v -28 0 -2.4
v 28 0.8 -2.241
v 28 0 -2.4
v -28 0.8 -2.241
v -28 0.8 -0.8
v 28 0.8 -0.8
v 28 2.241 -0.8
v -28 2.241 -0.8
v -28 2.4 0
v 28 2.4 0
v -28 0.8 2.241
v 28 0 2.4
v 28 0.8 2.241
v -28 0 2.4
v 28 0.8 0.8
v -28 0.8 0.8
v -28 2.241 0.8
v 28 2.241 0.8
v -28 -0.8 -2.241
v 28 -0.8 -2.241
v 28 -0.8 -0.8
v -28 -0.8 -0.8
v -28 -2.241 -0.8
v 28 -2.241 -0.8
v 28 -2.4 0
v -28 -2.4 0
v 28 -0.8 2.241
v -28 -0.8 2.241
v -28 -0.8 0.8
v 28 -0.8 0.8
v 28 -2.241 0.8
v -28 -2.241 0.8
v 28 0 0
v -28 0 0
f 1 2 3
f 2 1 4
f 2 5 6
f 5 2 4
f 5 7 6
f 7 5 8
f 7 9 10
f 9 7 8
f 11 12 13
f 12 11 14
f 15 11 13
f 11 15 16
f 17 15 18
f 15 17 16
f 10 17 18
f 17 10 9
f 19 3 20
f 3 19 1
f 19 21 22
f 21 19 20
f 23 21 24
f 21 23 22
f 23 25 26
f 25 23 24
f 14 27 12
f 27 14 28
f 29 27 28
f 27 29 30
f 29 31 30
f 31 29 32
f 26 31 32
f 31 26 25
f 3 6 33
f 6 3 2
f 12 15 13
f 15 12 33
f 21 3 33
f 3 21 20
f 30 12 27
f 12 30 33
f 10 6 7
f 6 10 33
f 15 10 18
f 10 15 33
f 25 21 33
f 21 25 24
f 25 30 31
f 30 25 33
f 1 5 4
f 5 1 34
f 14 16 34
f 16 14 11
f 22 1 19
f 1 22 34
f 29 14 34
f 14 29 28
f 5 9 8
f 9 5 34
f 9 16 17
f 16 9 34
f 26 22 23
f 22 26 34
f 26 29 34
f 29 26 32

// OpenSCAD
// file: ../p/axle.scad
use <../lib.scad>
function ldraw_lib__axle() = [
// 0 Axle
// 0 Name: axle.dat
// 0 Author: James Jessiman
// 0 !LDRAW_ORG Primitive UPDATE 2003-01
// 0 !LICENSE Licensed under CC BY 2.0 and CC BY 4.0 : see CAreadme.txt
// 
// 0 BFC CERTIFY CCW
  [0,"BFC","CERTIFY"],
  [0,"BFC","CCW"],
// 
// 0 !HISTORY 2000-04-23 [sbliss] Added conditional edges along outermost diameters
// 0 !HISTORY 2000-05-07 [PTadmin] Official Update 2000-01
// 0 !HISTORY 2002-11-08 [OrionP] Adjusted fit and precision
// 0 !HISTORY 2003-03-12 [PTadmin] Official Update 2003-01
// 0 !HISTORY 2007-06-24 [PTadmin] Header formatted for Contributor Agreement
// 0 !HISTORY 2008-07-01 [PTadmin] Official Update 2008-01
// 
// 
// 5 24 6 0 0 6 1 0 5.602 0 2 5.602 0 -2
  [5,24,6,0,0,6,1,0,5.602,0,2,5.602,0,-2],
// 5 24 0 0 6 0 1 6 2 0 5.602 -2 0 5.602
  [5,24,0,0,6,0,1,6,2,0,5.602,-2,0,5.602],
// 5 24 -6 0 0 -6 1 0 -5.602 0 -2 -5.602 0 2
  [5,24,-6,0,0,-6,1,0,-5.602,0,-2,-5.602,0,2],
// 5 24 0 0 -6 0 1 -6 -2 0 -5.602 2 0 -5.602
  [5,24,0,0,-6,0,1,-6,-2,0,-5.602,2,0,-5.602],
// 
// 2 24 6 0 0 5.602 0 2
  [2,24,6,0,0,5.602,0,2],
// 2 24 5.602 0 2 2 0 2
  [2,24,5.602,0,2,2,0,2],
// 2 24 2 0 2 2 0 5.602
  [2,24,2,0,2,2,0,5.602],
// 2 24 2 0 5.602 0 0 6
  [2,24,2,0,5.602,0,0,6],
// 2 24 -6 0 0 -5.602 0 2
  [2,24,-6,0,0,-5.602,0,2],
// 2 24 -5.602 0 2 -2 0 2
  [2,24,-5.602,0,2,-2,0,2],
// 2 24 -2 0 2 -2 0 5.602
  [2,24,-2,0,2,-2,0,5.602],
// 2 24 -2 0 5.602 -0 0 6
  [2,24,-2,0,5.602,-0,0,6],
// 2 24 6 0 -0 5.602 0 -2
  [2,24,6,0,-0,5.602,0,-2],
// 2 24 5.602 0 -2 2 0 -2
  [2,24,5.602,0,-2,2,0,-2],
// 2 24 2 0 -2 2 0 -5.602
  [2,24,2,0,-2,2,0,-5.602],
// 2 24 2 0 -5.602 0 0 -6
  [2,24,2,0,-5.602,0,0,-6],
// 2 24 -6 0 -0 -5.602 0 -2
  [2,24,-6,0,-0,-5.602,0,-2],
// 2 24 -5.602 0 -2 -2 0 -2
  [2,24,-5.602,0,-2,-2,0,-2],
// 2 24 -2 0 -2 -2 0 -5.602
  [2,24,-2,0,-2,-2,0,-5.602],
// 2 24 -2 0 -5.602 -0 0 -6
  [2,24,-2,0,-5.602,-0,0,-6],
// 2 24 6 1 0 5.602 1 2
  [2,24,6,1,0,5.602,1,2],
// 2 24 5.602 1 2 2 1 2
  [2,24,5.602,1,2,2,1,2],
// 2 24 2 1 2 2 1 5.602
  [2,24,2,1,2,2,1,5.602],
// 2 24 2 1 5.602 0 1 6
  [2,24,2,1,5.602,0,1,6],
// 2 24 -6 1 0 -5.602 1 2
  [2,24,-6,1,0,-5.602,1,2],
// 2 24 -5.602 1 2 -2 1 2
  [2,24,-5.602,1,2,-2,1,2],
// 2 24 -2 1 2 -2 1 5.602
  [2,24,-2,1,2,-2,1,5.602],
// 2 24 -2 1 5.602 -0 1 6
  [2,24,-2,1,5.602,-0,1,6],
// 2 24 6 1 -0 5.602 1 -2
  [2,24,6,1,-0,5.602,1,-2],
// 2 24 5.602 1 -2 2 1 -2
  [2,24,5.602,1,-2,2,1,-2],
// 2 24 2 1 -2 2 1 -5.602
  [2,24,2,1,-2,2,1,-5.602],
// 2 24 2 1 -5.602 0 1 -6
  [2,24,2,1,-5.602,0,1,-6],
// 2 24 -6 1 -0 -5.602 1 -2
  [2,24,-6,1,-0,-5.602,1,-2],
// 2 24 -5.602 1 -2 -2 1 -2
  [2,24,-5.602,1,-2,-2,1,-2],
// 2 24 -2 1 -2 -2 1 -5.602
  [2,24,-2,1,-2,-2,1,-5.602],
// 2 24 -2 1 -5.602 -0 1 -6
  [2,24,-2,1,-5.602,-0,1,-6],
// 
// 2 24 5.602 0 2 5.602 1 2
  [2,24,5.602,0,2,5.602,1,2],
// 2 24 2 0 2 2 1 2
  [2,24,2,0,2,2,1,2],
// 2 24 2 0 5.602 2 1 5.602
  [2,24,2,0,5.602,2,1,5.602],
// 2 24 -5.602 0 2 -5.602 1 2
  [2,24,-5.602,0,2,-5.602,1,2],
// 2 24 -2 0 2 -2 1 2
  [2,24,-2,0,2,-2,1,2],
// 2 24 -2 0 5.602 -2 1 5.602
  [2,24,-2,0,5.602,-2,1,5.602],
// 2 24 5.602 0 -2 5.602 1 -2
  [2,24,5.602,0,-2,5.602,1,-2],
// 2 24 2 0 -2 2 1 -2
  [2,24,2,0,-2,2,1,-2],
// 2 24 2 0 -5.602 2 1 -5.602
  [2,24,2,0,-5.602,2,1,-5.602],
// 2 24 -5.602 0 -2 -5.602 1 -2
  [2,24,-5.602,0,-2,-5.602,1,-2],
// 2 24 -2 0 -2 -2 1 -2
  [2,24,-2,0,-2,-2,1,-2],
// 2 24 -2 0 -5.602 -2 1 -5.602
  [2,24,-2,0,-5.602,-2,1,-5.602],
// 
// 4 16 6 0 0 6 1 0 5.602 1 2 5.602 0 2
  [4,16,6,0,0,6,1,0,5.602,1,2,5.602,0,2],
// 4 16 5.602 0 2 5.602 1 2 2 1 2 2 0 2
  [4,16,5.602,0,2,5.602,1,2,2,1,2,2,0,2],
// 4 16 2 0 2 2 1 2 2 1 5.602 2 0 5.602
  [4,16,2,0,2,2,1,2,2,1,5.602,2,0,5.602],
// 4 16 2 0 5.602 2 1 5.602 0 1 6 0 0 6
  [4,16,2,0,5.602,2,1,5.602,0,1,6,0,0,6],
// 4 16 -6 0 0 -5.602 0 2 -5.602 1 2 -6 1 0
  [4,16,-6,0,0,-5.602,0,2,-5.602,1,2,-6,1,0],
// 4 16 -5.602 0 2 -2 0 2 -2 1 2 -5.602 1 2
  [4,16,-5.602,0,2,-2,0,2,-2,1,2,-5.602,1,2],
// 4 16 -2 0 2 -2 0 5.602 -2 1 5.602 -2 1 2
  [4,16,-2,0,2,-2,0,5.602,-2,1,5.602,-2,1,2],
// 4 16 -2 0 5.602 -0 0 6 -0 1 6 -2 1 5.602
  [4,16,-2,0,5.602,-0,0,6,-0,1,6,-2,1,5.602],
// 4 16 6 0 -0 5.602 0 -2 5.602 1 -2 6 1 -0
  [4,16,6,0,-0,5.602,0,-2,5.602,1,-2,6,1,-0],
// 4 16 5.602 0 -2 2 0 -2 2 1 -2 5.602 1 -2
  [4,16,5.602,0,-2,2,0,-2,2,1,-2,5.602,1,-2],
// 4 16 2 0 -2 2 0 -5.602 2 1 -5.602 2 1 -2
  [4,16,2,0,-2,2,0,-5.602,2,1,-5.602,2,1,-2],
// 4 16 2 0 -5.602 0 0 -6 0 1 -6 2 1 -5.602
  [4,16,2,0,-5.602,0,0,-6,0,1,-6,2,1,-5.602],
// 4 16 -6 0 -0 -6 1 -0 -5.602 1 -2 -5.602 0 -2
  [4,16,-6,0,-0,-6,1,-0,-5.602,1,-2,-5.602,0,-2],
// 4 16 -5.602 0 -2 -5.602 1 -2 -2 1 -2 -2 0 -2
  [4,16,-5.602,0,-2,-5.602,1,-2,-2,1,-2,-2,0,-2],
// 4 16 -2 0 -2 -2 1 -2 -2 1 -5.602 -2 0 -5.602
  [4,16,-2,0,-2,-2,1,-2,-2,1,-5.602,-2,0,-5.602],
// 4 16 -2 0 -5.602 -2 1 -5.602 -0 1 -6 -0 0 -6
  [4,16,-2,0,-5.602,-2,1,-5.602,-0,1,-6,-0,0,-6],
// 
// 4 16 6 0 0 5.602 0 2 2 0 2 0 0 0
  [4,16,6,0,0,5.602,0,2,2,0,2,0,0,0],
// 4 16 -6 0 0 0 0 0 -2 0 2 -5.602 0 2
  [4,16,-6,0,0,0,0,0,-2,0,2,-5.602,0,2],
// 4 16 6 0 0 0 0 0 2 0 -2 5.602 0 -2
  [4,16,6,0,0,0,0,0,2,0,-2,5.602,0,-2],
// 4 16 -6 0 0 -5.602 0 -2 -2 0 -2 0 0 0
  [4,16,-6,0,0,-5.602,0,-2,-2,0,-2,0,0,0],
// 4 16 0 0 6 0 0 0 2 0 2 2 0 5.602
  [4,16,0,0,6,0,0,0,2,0,2,2,0,5.602],
// 4 16 0 0 6 -2 0 5.602 -2 0 2 0 0 0
  [4,16,0,0,6,-2,0,5.602,-2,0,2,0,0,0],
// 4 16 0 0 -6 2 0 -5.602 2 0 -2 0 0 0
  [4,16,0,0,-6,2,0,-5.602,2,0,-2,0,0,0],
// 4 16 0 0 -6 0 0 0 -2 0 -2 -2 0 -5.602
  [4,16,0,0,-6,0,0,0,-2,0,-2,-2,0,-5.602],
// 4 16 6 1 0 0 1 0 2 1 2 5.602 1 2
  [4,16,6,1,0,0,1,0,2,1,2,5.602,1,2],
// 4 16 -6 1 0 -5.602 1 2 -2 1 2 0 1 0
  [4,16,-6,1,0,-5.602,1,2,-2,1,2,0,1,0],
// 4 16 6 1 0 5.602 1 -2 2 1 -2 0 1 0
  [4,16,6,1,0,5.602,1,-2,2,1,-2,0,1,0],
// 4 16 -6 1 0 0 1 0 -2 1 -2 -5.602 1 -2
  [4,16,-6,1,0,0,1,0,-2,1,-2,-5.602,1,-2],
// 4 16 0 1 6 2 1 5.602 2 1 2 0 1 0
  [4,16,0,1,6,2,1,5.602,2,1,2,0,1,0],
// 4 16 0 1 6 0 1 0 -2 1 2 -2 1 5.602
  [4,16,0,1,6,0,1,0,-2,1,2,-2,1,5.602],
// 4 16 0 1 -6 0 1 0 2 1 -2 2 1 -5.602
  [4,16,0,1,-6,0,1,0,2,1,-2,2,1,-5.602],
// 4 16 0 1 -6 -2 1 -5.602 -2 1 -2 0 1 0
  [4,16,0,1,-6,-2,1,-5.602,-2,1,-2,0,1,0],
// 0
];
module ldraw_lib__axle(step=0, col=false, unit=2/5, alt=false, line=0.2, solid=!$preview)
    makepoly(ldraw_lib__axle(), step=step, col=col, unit=unit, alt=alt, line=line, solid=solid);
ldraw_lib__axle(line=0.2);
// file: 44294.scad
use <../lib.scad>
use <../p/axle.scad>
function ldraw_lib__44294() = [
// 0 Technic Axle  7
// 0 Name: 44294.dat
// 0 Author: Dan Boger [dan]
// 0 !LDRAW_ORG Part UPDATE 2005-01
// 0 !LICENSE Licensed under CC BY 2.0 and CC BY 4.0 : see CAreadme.txt
// 
// 0 BFC CERTIFY CCW
  [0,"BFC","CERTIFY"],
  [0,"BFC","CCW"],
// 
// 0 !HISTORY 2005-12-28 [PTadmin] Official Update 2005-01
// 0 !HISTORY 2007-07-04 [PTadmin] Header formatted for Contributor Agreement
// 0 !HISTORY 2008-07-01 [PTadmin] Official Update 2008-01
// 
// 
// 1 16 70 0 0 0 -140 0 1 0 0 0 0 1 axle.dat
  [1,16,70,0,0,0,-140,0,1,0,0,0,0,1, ldraw_lib__axle()],
// 0
// 
];
module ldraw_lib__44294(step=0, col=false, unit=2/5, alt=false, line=0.2, solid=!$preview)
    makepoly(ldraw_lib__44294(), step=step, col=col, unit=unit, alt=alt, line=line, solid=solid);
ldraw_lib__44294(line=0.2);
// main file
use <../lib.scad>
use <44294.scad>
function ldraw_lib__300() = [
// 0 ~Moved to 44294
// 0 Name: 300.dat
// 0 Author: [PTadmin]
// 0 !LDRAW_ORG Part UPDATE 2005-01
// 0 !LICENSE Licensed under CC BY 4.0 : see CAreadme.txt
// 
// 0 BFC CERTIFY CCW
  [0,"BFC","CERTIFY"],
  [0,"BFC","CCW"],
// 
// 0 !HISTORY 2003-08-01 [PTadmin] Official Update 2003-02
// 0 !HISTORY 2005-12-28 [PTadmin] Official Update 2005-01
// 0 !HISTORY 2007-05-23 [PTadmin] Header formatted for Contributor Agreement
// 0 !HISTORY 2008-07-01 [PTadmin] Official Update 2008-01
// 
// 
// 1 16 0 0 0 1 0 0 0 1 0 0 0 1 44294.dat
  [1,16,0,0,0,1,0,0,0,1,0,0,0,1, ldraw_lib__44294()],
];
module ldraw_lib__300(step=0, col=false, unit=2/5, alt=false, line=0.2, solid=!$preview)
    makepoly(ldraw_lib__300(), step=step, col=col, unit=unit, alt=alt, line=line, solid=solid);
ldraw_lib__300(line=0.2);
